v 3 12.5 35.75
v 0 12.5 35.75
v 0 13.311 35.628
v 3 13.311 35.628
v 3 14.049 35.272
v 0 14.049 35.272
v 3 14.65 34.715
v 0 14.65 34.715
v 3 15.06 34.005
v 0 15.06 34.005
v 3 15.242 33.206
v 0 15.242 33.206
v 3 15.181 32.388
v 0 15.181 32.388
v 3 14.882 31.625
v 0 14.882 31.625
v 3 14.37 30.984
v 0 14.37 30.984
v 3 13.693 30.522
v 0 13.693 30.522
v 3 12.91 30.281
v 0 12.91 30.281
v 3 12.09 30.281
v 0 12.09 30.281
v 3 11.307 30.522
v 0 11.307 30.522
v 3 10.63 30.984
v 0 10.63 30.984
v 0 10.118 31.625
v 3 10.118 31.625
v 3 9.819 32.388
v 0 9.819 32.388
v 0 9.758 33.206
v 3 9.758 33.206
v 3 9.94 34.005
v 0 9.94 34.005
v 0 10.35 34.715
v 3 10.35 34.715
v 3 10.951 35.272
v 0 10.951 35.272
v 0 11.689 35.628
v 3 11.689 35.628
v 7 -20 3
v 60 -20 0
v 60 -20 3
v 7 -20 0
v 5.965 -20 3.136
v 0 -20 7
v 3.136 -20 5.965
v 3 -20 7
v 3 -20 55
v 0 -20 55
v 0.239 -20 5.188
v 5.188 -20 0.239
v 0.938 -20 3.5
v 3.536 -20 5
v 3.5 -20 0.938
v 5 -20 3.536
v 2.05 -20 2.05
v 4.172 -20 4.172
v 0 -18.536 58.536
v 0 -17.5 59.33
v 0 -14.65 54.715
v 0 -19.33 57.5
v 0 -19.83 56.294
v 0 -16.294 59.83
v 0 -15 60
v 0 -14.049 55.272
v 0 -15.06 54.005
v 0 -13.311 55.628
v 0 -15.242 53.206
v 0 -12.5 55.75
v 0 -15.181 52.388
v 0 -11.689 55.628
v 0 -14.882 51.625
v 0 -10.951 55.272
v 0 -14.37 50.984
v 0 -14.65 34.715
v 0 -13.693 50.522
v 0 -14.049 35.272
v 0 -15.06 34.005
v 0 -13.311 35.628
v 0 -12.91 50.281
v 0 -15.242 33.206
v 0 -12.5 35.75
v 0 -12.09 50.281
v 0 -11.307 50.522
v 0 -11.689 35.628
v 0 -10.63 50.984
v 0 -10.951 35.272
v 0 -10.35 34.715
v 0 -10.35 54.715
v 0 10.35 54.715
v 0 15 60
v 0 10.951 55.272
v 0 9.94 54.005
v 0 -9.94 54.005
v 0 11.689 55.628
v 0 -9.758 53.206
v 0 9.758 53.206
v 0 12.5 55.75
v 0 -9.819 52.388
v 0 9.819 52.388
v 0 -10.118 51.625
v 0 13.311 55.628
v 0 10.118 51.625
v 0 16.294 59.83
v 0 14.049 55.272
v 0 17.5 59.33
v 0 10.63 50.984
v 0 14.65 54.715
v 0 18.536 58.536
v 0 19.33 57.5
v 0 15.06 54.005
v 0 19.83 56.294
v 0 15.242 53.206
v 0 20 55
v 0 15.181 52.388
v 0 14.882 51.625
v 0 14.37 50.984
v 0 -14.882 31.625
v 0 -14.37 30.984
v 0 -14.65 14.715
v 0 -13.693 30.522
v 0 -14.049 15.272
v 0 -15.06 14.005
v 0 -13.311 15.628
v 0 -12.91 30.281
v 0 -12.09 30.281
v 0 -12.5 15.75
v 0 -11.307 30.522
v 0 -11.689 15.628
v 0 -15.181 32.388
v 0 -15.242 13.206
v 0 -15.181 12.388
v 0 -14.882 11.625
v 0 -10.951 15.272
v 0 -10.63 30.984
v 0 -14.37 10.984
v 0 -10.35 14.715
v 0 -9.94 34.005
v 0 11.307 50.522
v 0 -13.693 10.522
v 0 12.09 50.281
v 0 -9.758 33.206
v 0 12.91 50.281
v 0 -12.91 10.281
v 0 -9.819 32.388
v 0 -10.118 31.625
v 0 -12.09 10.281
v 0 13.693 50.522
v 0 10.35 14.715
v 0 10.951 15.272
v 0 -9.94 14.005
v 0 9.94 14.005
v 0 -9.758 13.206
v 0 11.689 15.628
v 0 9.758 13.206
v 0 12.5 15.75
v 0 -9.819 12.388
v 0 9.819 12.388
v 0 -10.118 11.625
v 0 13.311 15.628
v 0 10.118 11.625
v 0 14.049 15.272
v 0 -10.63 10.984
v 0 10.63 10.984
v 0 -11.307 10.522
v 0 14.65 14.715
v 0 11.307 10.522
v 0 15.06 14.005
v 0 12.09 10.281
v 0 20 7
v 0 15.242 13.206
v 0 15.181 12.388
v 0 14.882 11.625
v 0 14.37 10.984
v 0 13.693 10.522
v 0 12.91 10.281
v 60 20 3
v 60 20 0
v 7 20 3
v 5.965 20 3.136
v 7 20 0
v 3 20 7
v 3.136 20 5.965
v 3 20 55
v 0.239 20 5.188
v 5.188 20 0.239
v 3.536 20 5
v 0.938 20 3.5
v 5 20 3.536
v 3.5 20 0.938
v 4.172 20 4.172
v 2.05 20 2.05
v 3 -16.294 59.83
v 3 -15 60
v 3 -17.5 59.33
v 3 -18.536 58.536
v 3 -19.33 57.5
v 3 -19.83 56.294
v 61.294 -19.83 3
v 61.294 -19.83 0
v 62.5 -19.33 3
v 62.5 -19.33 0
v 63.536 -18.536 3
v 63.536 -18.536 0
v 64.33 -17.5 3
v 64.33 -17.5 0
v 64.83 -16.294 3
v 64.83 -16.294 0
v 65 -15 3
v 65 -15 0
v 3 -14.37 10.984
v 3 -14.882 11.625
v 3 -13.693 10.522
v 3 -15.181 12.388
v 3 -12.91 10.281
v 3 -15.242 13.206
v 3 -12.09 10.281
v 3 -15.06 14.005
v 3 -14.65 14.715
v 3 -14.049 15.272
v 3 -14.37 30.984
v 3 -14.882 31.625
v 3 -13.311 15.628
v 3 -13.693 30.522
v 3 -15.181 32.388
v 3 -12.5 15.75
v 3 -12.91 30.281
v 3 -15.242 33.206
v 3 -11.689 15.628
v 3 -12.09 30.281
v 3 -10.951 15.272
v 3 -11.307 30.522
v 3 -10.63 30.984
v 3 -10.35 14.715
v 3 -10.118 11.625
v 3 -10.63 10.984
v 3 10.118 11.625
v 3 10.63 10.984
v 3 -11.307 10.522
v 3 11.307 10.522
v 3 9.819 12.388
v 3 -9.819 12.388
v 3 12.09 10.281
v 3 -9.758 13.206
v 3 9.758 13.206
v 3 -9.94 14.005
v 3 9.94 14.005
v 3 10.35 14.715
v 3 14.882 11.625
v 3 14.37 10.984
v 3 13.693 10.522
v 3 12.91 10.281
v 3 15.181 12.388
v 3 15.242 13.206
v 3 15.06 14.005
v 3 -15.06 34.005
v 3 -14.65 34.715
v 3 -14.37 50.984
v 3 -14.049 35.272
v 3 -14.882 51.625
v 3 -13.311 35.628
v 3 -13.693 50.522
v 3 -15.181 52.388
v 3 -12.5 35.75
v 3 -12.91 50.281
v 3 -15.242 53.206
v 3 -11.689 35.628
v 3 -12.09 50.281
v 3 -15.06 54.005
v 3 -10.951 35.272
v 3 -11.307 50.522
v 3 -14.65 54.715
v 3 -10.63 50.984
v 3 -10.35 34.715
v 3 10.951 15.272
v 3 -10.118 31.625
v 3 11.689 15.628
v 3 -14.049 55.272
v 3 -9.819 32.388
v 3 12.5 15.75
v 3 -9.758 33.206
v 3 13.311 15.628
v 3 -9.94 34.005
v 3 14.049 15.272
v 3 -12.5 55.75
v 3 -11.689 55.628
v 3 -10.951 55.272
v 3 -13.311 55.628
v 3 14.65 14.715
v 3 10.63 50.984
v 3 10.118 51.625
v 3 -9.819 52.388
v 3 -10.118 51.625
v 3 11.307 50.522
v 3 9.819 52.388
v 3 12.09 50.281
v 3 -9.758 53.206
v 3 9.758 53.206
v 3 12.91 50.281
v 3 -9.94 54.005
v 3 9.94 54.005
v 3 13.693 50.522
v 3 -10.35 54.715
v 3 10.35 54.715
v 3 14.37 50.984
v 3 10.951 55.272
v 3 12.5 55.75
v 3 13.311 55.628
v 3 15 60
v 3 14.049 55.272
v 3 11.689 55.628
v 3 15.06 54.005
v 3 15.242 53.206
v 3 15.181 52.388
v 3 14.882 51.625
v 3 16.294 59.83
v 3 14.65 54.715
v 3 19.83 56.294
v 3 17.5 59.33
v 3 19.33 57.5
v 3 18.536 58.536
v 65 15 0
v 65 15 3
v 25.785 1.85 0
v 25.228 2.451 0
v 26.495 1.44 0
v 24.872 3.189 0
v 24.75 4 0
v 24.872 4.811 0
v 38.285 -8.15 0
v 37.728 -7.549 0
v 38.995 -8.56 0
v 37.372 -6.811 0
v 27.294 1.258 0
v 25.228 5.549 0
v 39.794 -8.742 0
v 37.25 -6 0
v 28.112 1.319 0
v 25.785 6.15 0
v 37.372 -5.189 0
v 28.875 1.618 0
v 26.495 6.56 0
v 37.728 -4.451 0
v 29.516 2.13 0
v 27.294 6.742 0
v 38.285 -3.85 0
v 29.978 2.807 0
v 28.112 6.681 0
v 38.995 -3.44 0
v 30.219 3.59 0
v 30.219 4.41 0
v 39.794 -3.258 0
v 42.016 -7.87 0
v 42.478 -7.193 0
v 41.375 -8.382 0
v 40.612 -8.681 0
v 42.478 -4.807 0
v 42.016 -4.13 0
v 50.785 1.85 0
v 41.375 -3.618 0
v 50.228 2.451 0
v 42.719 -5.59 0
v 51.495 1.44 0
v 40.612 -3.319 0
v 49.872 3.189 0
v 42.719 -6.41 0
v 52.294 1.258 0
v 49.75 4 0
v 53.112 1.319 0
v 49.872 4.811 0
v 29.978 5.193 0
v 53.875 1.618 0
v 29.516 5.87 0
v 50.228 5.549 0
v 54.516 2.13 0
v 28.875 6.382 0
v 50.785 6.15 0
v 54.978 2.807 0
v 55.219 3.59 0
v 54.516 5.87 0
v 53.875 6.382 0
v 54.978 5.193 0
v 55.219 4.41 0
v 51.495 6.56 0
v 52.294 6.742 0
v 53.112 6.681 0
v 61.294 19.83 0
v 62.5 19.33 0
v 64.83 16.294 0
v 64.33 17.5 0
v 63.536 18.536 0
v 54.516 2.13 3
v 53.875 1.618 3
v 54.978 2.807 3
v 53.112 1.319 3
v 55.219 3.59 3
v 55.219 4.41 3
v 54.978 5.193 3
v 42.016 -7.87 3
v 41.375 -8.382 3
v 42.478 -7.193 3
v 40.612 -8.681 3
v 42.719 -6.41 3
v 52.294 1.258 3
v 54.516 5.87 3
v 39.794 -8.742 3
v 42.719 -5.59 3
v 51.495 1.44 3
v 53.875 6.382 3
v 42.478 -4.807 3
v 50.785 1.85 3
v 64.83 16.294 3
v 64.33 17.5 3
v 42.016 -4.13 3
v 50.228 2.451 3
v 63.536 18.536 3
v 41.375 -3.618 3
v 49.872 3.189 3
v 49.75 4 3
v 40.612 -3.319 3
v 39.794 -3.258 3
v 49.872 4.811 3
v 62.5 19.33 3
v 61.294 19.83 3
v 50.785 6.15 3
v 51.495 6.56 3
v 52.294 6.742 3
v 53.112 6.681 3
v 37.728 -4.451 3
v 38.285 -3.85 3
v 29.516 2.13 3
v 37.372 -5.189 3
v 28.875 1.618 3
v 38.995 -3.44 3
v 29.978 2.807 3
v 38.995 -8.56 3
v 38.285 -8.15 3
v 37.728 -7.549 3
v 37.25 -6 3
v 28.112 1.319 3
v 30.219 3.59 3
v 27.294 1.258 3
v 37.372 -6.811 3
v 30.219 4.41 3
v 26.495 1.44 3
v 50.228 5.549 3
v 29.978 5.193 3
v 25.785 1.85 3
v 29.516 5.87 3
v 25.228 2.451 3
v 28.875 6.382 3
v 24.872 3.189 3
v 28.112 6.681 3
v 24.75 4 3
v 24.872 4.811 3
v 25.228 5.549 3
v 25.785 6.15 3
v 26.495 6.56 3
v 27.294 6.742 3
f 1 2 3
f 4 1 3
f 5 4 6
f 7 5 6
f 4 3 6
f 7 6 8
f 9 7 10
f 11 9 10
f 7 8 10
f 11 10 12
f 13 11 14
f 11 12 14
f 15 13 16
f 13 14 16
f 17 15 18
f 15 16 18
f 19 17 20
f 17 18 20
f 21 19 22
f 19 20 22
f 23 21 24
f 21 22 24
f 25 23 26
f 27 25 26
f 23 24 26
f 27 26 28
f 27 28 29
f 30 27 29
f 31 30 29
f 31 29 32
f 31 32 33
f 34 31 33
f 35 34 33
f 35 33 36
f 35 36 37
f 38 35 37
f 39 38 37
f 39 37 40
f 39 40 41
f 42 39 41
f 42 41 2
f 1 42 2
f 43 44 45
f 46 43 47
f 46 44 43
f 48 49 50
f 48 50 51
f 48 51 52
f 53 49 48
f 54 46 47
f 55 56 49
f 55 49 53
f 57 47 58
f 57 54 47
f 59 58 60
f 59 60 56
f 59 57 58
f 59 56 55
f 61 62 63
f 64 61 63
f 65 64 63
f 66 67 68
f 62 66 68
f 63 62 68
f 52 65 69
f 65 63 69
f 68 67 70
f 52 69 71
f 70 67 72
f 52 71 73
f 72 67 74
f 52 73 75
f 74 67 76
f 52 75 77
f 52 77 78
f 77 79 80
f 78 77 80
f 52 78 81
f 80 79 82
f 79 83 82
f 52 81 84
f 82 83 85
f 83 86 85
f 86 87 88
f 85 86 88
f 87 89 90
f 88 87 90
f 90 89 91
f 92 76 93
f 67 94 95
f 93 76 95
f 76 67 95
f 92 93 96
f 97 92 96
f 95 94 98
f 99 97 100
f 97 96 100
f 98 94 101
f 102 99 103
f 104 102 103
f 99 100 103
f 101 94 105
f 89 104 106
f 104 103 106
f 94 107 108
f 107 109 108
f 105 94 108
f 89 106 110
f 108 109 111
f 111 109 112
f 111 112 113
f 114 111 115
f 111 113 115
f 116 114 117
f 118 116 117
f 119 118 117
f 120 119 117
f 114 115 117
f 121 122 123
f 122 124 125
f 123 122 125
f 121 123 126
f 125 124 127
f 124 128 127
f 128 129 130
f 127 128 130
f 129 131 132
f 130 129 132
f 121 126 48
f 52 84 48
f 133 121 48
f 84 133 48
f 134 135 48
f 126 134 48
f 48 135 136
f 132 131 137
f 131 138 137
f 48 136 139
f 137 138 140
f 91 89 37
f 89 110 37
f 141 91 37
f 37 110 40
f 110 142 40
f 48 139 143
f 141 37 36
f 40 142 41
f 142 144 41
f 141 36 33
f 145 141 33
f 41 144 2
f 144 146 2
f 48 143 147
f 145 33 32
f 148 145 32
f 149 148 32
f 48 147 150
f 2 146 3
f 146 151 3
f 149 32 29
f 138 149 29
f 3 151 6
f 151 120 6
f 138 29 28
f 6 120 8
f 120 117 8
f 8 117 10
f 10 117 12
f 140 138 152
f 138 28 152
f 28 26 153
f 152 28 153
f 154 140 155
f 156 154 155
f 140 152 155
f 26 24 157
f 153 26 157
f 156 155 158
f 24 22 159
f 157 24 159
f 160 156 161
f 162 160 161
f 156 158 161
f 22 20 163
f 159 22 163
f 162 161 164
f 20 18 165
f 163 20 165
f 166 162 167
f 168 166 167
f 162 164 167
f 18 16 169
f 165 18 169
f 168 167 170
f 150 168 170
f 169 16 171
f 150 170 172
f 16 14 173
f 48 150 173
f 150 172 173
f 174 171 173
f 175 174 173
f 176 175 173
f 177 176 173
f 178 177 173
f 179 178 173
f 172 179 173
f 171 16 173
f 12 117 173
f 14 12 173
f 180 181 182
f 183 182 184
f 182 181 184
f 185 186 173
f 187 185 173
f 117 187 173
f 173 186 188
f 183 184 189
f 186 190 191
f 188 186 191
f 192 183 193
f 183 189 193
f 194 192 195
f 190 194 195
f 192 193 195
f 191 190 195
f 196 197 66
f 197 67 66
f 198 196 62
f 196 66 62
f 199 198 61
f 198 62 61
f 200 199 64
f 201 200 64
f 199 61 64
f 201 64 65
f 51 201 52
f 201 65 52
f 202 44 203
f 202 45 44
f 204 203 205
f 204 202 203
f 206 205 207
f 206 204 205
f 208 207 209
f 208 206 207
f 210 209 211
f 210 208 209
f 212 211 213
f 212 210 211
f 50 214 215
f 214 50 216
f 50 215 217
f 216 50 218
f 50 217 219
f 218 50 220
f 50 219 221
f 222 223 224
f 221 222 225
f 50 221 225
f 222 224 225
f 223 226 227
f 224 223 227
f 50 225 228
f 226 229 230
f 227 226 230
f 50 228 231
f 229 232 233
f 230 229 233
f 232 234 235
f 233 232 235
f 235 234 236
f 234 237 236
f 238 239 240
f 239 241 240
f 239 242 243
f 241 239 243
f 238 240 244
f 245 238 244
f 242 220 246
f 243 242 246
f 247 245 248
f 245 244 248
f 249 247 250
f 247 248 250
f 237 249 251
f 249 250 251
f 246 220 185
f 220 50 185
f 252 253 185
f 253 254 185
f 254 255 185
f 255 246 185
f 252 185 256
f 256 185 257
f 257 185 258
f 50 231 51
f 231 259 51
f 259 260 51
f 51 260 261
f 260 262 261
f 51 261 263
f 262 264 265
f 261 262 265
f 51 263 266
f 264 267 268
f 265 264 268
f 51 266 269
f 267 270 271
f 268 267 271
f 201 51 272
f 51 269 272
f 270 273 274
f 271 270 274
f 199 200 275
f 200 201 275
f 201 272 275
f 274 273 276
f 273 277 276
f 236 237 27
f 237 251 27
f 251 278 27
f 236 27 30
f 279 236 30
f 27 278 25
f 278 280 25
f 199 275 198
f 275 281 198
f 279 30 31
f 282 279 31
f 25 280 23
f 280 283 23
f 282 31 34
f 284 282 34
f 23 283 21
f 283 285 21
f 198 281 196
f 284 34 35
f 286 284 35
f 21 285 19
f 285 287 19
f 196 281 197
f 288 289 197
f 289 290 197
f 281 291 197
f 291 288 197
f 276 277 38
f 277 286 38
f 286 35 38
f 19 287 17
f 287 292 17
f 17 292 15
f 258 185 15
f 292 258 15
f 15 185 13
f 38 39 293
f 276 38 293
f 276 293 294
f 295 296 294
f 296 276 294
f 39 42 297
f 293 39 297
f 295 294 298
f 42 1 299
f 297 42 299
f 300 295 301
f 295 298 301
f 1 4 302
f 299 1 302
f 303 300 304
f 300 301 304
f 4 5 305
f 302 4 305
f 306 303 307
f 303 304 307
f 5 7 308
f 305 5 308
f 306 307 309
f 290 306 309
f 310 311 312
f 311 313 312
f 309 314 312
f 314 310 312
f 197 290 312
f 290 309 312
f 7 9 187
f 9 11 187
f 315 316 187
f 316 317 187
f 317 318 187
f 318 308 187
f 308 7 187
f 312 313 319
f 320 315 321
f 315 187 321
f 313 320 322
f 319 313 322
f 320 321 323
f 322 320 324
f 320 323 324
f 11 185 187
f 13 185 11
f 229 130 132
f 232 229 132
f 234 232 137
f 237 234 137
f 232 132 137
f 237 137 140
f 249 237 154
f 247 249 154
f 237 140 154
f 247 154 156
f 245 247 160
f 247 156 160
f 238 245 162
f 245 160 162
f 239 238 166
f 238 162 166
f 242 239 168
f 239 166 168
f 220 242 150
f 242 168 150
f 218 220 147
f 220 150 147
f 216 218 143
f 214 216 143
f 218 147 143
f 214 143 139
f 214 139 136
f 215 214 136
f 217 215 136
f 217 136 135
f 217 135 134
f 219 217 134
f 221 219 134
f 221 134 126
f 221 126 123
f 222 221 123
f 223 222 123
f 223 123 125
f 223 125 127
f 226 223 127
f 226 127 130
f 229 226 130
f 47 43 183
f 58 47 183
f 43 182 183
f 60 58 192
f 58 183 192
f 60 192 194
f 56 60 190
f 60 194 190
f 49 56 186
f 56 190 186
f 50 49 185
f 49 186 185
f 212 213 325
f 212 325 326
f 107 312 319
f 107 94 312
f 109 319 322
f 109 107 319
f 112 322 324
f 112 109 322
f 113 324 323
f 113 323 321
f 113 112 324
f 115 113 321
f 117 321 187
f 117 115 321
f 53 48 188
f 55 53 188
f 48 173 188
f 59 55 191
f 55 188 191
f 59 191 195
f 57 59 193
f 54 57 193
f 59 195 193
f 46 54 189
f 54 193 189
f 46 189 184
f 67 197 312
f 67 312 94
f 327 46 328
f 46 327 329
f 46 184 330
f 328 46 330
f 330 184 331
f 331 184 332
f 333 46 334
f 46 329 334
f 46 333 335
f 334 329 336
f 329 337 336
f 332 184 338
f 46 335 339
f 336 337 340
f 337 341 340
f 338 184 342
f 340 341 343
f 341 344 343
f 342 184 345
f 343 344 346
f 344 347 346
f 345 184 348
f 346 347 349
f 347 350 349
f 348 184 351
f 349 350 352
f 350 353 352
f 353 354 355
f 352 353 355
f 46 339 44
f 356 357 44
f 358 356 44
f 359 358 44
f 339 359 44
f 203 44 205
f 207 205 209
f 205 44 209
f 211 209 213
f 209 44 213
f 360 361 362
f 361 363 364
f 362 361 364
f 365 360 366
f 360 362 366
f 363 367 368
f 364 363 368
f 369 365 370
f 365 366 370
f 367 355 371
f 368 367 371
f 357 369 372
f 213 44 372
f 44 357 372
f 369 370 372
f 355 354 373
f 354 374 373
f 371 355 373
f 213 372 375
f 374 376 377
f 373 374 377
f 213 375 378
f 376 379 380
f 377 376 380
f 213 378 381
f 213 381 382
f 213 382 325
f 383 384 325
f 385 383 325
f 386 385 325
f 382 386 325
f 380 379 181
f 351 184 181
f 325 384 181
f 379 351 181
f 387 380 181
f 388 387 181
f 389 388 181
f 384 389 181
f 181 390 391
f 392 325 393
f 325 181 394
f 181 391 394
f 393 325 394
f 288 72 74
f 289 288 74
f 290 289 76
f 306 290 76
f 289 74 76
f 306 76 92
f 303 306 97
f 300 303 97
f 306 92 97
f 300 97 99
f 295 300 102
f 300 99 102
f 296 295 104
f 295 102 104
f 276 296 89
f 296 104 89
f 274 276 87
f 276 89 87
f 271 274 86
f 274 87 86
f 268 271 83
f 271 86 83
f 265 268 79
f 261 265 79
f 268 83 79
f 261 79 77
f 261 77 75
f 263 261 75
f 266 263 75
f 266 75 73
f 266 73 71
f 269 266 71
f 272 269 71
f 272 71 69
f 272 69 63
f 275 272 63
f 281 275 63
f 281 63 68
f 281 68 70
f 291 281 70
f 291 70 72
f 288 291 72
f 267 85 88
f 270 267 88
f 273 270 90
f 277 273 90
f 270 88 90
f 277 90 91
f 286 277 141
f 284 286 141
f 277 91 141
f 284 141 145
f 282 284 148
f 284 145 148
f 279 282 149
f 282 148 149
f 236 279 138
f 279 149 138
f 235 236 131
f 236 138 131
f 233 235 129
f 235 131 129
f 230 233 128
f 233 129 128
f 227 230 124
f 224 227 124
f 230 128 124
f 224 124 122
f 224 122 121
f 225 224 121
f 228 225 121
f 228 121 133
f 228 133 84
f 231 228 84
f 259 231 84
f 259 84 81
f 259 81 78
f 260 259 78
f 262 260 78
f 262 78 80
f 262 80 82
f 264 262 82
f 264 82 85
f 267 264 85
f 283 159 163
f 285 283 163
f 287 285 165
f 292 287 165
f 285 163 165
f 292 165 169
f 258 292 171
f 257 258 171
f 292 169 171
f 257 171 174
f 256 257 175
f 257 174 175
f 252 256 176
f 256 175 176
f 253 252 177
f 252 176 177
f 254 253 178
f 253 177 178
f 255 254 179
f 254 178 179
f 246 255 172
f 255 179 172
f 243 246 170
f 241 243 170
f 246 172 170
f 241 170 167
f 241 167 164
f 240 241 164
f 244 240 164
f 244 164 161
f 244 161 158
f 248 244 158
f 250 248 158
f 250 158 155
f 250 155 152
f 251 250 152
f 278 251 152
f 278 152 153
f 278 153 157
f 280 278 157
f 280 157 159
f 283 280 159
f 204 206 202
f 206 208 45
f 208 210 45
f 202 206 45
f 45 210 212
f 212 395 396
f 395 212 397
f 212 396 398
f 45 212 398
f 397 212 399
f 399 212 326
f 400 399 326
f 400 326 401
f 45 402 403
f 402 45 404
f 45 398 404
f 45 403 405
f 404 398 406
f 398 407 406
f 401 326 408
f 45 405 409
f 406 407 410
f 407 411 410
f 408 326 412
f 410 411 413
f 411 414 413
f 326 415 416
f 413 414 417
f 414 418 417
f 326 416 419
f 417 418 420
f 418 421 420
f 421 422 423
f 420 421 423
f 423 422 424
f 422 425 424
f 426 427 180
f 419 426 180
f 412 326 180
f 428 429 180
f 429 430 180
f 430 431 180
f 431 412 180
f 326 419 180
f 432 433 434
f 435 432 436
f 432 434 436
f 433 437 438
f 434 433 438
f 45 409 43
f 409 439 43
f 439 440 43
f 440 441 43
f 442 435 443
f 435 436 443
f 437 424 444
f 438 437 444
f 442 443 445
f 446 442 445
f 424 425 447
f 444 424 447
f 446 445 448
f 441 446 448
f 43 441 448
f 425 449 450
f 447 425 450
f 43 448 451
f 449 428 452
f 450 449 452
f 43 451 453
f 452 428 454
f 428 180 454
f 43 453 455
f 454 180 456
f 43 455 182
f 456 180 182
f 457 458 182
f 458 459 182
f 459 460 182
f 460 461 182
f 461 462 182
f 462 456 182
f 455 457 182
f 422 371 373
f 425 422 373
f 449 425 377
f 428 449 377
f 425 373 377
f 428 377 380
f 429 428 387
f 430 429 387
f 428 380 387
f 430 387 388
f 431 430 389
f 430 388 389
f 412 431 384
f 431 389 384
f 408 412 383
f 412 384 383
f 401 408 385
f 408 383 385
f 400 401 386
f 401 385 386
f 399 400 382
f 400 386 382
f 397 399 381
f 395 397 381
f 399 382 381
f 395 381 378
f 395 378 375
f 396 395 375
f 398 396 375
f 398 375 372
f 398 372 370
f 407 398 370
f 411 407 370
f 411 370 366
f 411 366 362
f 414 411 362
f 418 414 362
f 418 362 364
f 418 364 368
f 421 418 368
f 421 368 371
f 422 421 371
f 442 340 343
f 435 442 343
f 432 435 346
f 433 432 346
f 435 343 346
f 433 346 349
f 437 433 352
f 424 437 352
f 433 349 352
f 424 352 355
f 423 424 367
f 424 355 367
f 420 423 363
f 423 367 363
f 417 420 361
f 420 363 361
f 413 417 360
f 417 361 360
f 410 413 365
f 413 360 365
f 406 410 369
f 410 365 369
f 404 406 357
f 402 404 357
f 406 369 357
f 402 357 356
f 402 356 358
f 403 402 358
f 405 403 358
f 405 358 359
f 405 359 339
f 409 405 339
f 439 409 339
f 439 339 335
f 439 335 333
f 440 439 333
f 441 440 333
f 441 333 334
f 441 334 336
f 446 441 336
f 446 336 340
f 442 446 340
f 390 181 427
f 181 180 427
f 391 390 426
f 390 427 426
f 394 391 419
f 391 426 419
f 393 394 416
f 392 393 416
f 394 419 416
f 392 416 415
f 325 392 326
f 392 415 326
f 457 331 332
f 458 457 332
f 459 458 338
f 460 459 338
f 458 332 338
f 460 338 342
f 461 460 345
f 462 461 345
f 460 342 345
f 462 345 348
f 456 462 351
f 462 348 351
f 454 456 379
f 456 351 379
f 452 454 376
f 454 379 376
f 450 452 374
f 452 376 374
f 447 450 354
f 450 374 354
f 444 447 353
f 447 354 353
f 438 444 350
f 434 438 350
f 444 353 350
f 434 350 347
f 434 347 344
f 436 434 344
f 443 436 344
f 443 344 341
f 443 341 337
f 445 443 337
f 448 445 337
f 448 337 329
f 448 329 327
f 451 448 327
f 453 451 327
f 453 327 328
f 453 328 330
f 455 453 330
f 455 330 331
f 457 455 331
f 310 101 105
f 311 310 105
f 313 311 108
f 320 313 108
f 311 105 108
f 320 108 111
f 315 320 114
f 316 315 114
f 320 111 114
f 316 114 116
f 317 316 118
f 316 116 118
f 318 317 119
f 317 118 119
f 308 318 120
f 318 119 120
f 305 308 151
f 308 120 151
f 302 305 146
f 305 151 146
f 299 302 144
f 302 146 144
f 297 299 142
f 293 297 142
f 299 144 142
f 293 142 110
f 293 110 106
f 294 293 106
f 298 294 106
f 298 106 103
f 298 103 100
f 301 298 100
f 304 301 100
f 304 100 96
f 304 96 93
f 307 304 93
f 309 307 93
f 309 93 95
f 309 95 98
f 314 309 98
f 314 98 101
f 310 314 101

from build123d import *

# Parameters (mm, degrees)
ODGI_CIE_BAZOWE1_DEPTH = 20
OTW_R_POD_RUB_M51_D    = 5.5
OTW_R_POD_RUB_M52_D    = 5.5
ZAOKR_GLENIE1_R        = 5


# Sheet-metal steps are written as plain solids
with BuildPart() as part:
    # Szkic1 → Odgięcie bazowe1 (new, symmetric)
    with BuildSketch(Plane(origin=(0, 0, 0), x_dir=(1, 0, 0), z_dir=(0, 1, 0))):
        with BuildLine():
            Line((0, -60), (0, -7))
            ThreePointArc((0, -7), (2.050252532, -2.050252532), (7, 0))
            Line((7, 0), (65, 0))
            Line((65, 0), (65, -3))
            Line((65, -3), (7, -3))
            ThreePointArc((7, -3), (4.171572875, -4.171572875), (3, -7))
            Line((3, -7), (3, -60))
            Line((3, -60), (0, -60))
        make_face()
    extrude(amount=ODGI_CIE_BAZOWE1_DEPTH, both=True)

    # Otwór pod śrubę M51 (through all)
    with Locations(Plane.XY.offset(3)):
        with Locations((27.5, 4), (40, -6), (52.5, 4)):
            Hole(OTW_R_POD_RUB_M51_D / 2)

    # Otwór pod śrubę M52 (through all)
    with Locations(Plane(origin=(3, 0, 0), x_dir=(0, 0, -1), z_dir=(1, 0, 0))):
        with Locations((-53, 12.5), (-33, 12.5), (-13, 12.5), (-13, -12.5), (-33, -12.5), (-53, -12.5)):
            Hole(OTW_R_POD_RUB_M52_D / 2)

    # Zaokrąglenie1
    zaokr_glenie1_edges = [part.edges().sort_by_distance(p)[0] for p in [
        (65, 20, 1.5),
        (65, -20, 1.5),
        (1.5, 20, 60),
        (1.5, -20, 60),
    ]]
    fillet(zaokr_glenie1_edges, radius=ZAOKR_GLENIE1_R)


solid = part.part
